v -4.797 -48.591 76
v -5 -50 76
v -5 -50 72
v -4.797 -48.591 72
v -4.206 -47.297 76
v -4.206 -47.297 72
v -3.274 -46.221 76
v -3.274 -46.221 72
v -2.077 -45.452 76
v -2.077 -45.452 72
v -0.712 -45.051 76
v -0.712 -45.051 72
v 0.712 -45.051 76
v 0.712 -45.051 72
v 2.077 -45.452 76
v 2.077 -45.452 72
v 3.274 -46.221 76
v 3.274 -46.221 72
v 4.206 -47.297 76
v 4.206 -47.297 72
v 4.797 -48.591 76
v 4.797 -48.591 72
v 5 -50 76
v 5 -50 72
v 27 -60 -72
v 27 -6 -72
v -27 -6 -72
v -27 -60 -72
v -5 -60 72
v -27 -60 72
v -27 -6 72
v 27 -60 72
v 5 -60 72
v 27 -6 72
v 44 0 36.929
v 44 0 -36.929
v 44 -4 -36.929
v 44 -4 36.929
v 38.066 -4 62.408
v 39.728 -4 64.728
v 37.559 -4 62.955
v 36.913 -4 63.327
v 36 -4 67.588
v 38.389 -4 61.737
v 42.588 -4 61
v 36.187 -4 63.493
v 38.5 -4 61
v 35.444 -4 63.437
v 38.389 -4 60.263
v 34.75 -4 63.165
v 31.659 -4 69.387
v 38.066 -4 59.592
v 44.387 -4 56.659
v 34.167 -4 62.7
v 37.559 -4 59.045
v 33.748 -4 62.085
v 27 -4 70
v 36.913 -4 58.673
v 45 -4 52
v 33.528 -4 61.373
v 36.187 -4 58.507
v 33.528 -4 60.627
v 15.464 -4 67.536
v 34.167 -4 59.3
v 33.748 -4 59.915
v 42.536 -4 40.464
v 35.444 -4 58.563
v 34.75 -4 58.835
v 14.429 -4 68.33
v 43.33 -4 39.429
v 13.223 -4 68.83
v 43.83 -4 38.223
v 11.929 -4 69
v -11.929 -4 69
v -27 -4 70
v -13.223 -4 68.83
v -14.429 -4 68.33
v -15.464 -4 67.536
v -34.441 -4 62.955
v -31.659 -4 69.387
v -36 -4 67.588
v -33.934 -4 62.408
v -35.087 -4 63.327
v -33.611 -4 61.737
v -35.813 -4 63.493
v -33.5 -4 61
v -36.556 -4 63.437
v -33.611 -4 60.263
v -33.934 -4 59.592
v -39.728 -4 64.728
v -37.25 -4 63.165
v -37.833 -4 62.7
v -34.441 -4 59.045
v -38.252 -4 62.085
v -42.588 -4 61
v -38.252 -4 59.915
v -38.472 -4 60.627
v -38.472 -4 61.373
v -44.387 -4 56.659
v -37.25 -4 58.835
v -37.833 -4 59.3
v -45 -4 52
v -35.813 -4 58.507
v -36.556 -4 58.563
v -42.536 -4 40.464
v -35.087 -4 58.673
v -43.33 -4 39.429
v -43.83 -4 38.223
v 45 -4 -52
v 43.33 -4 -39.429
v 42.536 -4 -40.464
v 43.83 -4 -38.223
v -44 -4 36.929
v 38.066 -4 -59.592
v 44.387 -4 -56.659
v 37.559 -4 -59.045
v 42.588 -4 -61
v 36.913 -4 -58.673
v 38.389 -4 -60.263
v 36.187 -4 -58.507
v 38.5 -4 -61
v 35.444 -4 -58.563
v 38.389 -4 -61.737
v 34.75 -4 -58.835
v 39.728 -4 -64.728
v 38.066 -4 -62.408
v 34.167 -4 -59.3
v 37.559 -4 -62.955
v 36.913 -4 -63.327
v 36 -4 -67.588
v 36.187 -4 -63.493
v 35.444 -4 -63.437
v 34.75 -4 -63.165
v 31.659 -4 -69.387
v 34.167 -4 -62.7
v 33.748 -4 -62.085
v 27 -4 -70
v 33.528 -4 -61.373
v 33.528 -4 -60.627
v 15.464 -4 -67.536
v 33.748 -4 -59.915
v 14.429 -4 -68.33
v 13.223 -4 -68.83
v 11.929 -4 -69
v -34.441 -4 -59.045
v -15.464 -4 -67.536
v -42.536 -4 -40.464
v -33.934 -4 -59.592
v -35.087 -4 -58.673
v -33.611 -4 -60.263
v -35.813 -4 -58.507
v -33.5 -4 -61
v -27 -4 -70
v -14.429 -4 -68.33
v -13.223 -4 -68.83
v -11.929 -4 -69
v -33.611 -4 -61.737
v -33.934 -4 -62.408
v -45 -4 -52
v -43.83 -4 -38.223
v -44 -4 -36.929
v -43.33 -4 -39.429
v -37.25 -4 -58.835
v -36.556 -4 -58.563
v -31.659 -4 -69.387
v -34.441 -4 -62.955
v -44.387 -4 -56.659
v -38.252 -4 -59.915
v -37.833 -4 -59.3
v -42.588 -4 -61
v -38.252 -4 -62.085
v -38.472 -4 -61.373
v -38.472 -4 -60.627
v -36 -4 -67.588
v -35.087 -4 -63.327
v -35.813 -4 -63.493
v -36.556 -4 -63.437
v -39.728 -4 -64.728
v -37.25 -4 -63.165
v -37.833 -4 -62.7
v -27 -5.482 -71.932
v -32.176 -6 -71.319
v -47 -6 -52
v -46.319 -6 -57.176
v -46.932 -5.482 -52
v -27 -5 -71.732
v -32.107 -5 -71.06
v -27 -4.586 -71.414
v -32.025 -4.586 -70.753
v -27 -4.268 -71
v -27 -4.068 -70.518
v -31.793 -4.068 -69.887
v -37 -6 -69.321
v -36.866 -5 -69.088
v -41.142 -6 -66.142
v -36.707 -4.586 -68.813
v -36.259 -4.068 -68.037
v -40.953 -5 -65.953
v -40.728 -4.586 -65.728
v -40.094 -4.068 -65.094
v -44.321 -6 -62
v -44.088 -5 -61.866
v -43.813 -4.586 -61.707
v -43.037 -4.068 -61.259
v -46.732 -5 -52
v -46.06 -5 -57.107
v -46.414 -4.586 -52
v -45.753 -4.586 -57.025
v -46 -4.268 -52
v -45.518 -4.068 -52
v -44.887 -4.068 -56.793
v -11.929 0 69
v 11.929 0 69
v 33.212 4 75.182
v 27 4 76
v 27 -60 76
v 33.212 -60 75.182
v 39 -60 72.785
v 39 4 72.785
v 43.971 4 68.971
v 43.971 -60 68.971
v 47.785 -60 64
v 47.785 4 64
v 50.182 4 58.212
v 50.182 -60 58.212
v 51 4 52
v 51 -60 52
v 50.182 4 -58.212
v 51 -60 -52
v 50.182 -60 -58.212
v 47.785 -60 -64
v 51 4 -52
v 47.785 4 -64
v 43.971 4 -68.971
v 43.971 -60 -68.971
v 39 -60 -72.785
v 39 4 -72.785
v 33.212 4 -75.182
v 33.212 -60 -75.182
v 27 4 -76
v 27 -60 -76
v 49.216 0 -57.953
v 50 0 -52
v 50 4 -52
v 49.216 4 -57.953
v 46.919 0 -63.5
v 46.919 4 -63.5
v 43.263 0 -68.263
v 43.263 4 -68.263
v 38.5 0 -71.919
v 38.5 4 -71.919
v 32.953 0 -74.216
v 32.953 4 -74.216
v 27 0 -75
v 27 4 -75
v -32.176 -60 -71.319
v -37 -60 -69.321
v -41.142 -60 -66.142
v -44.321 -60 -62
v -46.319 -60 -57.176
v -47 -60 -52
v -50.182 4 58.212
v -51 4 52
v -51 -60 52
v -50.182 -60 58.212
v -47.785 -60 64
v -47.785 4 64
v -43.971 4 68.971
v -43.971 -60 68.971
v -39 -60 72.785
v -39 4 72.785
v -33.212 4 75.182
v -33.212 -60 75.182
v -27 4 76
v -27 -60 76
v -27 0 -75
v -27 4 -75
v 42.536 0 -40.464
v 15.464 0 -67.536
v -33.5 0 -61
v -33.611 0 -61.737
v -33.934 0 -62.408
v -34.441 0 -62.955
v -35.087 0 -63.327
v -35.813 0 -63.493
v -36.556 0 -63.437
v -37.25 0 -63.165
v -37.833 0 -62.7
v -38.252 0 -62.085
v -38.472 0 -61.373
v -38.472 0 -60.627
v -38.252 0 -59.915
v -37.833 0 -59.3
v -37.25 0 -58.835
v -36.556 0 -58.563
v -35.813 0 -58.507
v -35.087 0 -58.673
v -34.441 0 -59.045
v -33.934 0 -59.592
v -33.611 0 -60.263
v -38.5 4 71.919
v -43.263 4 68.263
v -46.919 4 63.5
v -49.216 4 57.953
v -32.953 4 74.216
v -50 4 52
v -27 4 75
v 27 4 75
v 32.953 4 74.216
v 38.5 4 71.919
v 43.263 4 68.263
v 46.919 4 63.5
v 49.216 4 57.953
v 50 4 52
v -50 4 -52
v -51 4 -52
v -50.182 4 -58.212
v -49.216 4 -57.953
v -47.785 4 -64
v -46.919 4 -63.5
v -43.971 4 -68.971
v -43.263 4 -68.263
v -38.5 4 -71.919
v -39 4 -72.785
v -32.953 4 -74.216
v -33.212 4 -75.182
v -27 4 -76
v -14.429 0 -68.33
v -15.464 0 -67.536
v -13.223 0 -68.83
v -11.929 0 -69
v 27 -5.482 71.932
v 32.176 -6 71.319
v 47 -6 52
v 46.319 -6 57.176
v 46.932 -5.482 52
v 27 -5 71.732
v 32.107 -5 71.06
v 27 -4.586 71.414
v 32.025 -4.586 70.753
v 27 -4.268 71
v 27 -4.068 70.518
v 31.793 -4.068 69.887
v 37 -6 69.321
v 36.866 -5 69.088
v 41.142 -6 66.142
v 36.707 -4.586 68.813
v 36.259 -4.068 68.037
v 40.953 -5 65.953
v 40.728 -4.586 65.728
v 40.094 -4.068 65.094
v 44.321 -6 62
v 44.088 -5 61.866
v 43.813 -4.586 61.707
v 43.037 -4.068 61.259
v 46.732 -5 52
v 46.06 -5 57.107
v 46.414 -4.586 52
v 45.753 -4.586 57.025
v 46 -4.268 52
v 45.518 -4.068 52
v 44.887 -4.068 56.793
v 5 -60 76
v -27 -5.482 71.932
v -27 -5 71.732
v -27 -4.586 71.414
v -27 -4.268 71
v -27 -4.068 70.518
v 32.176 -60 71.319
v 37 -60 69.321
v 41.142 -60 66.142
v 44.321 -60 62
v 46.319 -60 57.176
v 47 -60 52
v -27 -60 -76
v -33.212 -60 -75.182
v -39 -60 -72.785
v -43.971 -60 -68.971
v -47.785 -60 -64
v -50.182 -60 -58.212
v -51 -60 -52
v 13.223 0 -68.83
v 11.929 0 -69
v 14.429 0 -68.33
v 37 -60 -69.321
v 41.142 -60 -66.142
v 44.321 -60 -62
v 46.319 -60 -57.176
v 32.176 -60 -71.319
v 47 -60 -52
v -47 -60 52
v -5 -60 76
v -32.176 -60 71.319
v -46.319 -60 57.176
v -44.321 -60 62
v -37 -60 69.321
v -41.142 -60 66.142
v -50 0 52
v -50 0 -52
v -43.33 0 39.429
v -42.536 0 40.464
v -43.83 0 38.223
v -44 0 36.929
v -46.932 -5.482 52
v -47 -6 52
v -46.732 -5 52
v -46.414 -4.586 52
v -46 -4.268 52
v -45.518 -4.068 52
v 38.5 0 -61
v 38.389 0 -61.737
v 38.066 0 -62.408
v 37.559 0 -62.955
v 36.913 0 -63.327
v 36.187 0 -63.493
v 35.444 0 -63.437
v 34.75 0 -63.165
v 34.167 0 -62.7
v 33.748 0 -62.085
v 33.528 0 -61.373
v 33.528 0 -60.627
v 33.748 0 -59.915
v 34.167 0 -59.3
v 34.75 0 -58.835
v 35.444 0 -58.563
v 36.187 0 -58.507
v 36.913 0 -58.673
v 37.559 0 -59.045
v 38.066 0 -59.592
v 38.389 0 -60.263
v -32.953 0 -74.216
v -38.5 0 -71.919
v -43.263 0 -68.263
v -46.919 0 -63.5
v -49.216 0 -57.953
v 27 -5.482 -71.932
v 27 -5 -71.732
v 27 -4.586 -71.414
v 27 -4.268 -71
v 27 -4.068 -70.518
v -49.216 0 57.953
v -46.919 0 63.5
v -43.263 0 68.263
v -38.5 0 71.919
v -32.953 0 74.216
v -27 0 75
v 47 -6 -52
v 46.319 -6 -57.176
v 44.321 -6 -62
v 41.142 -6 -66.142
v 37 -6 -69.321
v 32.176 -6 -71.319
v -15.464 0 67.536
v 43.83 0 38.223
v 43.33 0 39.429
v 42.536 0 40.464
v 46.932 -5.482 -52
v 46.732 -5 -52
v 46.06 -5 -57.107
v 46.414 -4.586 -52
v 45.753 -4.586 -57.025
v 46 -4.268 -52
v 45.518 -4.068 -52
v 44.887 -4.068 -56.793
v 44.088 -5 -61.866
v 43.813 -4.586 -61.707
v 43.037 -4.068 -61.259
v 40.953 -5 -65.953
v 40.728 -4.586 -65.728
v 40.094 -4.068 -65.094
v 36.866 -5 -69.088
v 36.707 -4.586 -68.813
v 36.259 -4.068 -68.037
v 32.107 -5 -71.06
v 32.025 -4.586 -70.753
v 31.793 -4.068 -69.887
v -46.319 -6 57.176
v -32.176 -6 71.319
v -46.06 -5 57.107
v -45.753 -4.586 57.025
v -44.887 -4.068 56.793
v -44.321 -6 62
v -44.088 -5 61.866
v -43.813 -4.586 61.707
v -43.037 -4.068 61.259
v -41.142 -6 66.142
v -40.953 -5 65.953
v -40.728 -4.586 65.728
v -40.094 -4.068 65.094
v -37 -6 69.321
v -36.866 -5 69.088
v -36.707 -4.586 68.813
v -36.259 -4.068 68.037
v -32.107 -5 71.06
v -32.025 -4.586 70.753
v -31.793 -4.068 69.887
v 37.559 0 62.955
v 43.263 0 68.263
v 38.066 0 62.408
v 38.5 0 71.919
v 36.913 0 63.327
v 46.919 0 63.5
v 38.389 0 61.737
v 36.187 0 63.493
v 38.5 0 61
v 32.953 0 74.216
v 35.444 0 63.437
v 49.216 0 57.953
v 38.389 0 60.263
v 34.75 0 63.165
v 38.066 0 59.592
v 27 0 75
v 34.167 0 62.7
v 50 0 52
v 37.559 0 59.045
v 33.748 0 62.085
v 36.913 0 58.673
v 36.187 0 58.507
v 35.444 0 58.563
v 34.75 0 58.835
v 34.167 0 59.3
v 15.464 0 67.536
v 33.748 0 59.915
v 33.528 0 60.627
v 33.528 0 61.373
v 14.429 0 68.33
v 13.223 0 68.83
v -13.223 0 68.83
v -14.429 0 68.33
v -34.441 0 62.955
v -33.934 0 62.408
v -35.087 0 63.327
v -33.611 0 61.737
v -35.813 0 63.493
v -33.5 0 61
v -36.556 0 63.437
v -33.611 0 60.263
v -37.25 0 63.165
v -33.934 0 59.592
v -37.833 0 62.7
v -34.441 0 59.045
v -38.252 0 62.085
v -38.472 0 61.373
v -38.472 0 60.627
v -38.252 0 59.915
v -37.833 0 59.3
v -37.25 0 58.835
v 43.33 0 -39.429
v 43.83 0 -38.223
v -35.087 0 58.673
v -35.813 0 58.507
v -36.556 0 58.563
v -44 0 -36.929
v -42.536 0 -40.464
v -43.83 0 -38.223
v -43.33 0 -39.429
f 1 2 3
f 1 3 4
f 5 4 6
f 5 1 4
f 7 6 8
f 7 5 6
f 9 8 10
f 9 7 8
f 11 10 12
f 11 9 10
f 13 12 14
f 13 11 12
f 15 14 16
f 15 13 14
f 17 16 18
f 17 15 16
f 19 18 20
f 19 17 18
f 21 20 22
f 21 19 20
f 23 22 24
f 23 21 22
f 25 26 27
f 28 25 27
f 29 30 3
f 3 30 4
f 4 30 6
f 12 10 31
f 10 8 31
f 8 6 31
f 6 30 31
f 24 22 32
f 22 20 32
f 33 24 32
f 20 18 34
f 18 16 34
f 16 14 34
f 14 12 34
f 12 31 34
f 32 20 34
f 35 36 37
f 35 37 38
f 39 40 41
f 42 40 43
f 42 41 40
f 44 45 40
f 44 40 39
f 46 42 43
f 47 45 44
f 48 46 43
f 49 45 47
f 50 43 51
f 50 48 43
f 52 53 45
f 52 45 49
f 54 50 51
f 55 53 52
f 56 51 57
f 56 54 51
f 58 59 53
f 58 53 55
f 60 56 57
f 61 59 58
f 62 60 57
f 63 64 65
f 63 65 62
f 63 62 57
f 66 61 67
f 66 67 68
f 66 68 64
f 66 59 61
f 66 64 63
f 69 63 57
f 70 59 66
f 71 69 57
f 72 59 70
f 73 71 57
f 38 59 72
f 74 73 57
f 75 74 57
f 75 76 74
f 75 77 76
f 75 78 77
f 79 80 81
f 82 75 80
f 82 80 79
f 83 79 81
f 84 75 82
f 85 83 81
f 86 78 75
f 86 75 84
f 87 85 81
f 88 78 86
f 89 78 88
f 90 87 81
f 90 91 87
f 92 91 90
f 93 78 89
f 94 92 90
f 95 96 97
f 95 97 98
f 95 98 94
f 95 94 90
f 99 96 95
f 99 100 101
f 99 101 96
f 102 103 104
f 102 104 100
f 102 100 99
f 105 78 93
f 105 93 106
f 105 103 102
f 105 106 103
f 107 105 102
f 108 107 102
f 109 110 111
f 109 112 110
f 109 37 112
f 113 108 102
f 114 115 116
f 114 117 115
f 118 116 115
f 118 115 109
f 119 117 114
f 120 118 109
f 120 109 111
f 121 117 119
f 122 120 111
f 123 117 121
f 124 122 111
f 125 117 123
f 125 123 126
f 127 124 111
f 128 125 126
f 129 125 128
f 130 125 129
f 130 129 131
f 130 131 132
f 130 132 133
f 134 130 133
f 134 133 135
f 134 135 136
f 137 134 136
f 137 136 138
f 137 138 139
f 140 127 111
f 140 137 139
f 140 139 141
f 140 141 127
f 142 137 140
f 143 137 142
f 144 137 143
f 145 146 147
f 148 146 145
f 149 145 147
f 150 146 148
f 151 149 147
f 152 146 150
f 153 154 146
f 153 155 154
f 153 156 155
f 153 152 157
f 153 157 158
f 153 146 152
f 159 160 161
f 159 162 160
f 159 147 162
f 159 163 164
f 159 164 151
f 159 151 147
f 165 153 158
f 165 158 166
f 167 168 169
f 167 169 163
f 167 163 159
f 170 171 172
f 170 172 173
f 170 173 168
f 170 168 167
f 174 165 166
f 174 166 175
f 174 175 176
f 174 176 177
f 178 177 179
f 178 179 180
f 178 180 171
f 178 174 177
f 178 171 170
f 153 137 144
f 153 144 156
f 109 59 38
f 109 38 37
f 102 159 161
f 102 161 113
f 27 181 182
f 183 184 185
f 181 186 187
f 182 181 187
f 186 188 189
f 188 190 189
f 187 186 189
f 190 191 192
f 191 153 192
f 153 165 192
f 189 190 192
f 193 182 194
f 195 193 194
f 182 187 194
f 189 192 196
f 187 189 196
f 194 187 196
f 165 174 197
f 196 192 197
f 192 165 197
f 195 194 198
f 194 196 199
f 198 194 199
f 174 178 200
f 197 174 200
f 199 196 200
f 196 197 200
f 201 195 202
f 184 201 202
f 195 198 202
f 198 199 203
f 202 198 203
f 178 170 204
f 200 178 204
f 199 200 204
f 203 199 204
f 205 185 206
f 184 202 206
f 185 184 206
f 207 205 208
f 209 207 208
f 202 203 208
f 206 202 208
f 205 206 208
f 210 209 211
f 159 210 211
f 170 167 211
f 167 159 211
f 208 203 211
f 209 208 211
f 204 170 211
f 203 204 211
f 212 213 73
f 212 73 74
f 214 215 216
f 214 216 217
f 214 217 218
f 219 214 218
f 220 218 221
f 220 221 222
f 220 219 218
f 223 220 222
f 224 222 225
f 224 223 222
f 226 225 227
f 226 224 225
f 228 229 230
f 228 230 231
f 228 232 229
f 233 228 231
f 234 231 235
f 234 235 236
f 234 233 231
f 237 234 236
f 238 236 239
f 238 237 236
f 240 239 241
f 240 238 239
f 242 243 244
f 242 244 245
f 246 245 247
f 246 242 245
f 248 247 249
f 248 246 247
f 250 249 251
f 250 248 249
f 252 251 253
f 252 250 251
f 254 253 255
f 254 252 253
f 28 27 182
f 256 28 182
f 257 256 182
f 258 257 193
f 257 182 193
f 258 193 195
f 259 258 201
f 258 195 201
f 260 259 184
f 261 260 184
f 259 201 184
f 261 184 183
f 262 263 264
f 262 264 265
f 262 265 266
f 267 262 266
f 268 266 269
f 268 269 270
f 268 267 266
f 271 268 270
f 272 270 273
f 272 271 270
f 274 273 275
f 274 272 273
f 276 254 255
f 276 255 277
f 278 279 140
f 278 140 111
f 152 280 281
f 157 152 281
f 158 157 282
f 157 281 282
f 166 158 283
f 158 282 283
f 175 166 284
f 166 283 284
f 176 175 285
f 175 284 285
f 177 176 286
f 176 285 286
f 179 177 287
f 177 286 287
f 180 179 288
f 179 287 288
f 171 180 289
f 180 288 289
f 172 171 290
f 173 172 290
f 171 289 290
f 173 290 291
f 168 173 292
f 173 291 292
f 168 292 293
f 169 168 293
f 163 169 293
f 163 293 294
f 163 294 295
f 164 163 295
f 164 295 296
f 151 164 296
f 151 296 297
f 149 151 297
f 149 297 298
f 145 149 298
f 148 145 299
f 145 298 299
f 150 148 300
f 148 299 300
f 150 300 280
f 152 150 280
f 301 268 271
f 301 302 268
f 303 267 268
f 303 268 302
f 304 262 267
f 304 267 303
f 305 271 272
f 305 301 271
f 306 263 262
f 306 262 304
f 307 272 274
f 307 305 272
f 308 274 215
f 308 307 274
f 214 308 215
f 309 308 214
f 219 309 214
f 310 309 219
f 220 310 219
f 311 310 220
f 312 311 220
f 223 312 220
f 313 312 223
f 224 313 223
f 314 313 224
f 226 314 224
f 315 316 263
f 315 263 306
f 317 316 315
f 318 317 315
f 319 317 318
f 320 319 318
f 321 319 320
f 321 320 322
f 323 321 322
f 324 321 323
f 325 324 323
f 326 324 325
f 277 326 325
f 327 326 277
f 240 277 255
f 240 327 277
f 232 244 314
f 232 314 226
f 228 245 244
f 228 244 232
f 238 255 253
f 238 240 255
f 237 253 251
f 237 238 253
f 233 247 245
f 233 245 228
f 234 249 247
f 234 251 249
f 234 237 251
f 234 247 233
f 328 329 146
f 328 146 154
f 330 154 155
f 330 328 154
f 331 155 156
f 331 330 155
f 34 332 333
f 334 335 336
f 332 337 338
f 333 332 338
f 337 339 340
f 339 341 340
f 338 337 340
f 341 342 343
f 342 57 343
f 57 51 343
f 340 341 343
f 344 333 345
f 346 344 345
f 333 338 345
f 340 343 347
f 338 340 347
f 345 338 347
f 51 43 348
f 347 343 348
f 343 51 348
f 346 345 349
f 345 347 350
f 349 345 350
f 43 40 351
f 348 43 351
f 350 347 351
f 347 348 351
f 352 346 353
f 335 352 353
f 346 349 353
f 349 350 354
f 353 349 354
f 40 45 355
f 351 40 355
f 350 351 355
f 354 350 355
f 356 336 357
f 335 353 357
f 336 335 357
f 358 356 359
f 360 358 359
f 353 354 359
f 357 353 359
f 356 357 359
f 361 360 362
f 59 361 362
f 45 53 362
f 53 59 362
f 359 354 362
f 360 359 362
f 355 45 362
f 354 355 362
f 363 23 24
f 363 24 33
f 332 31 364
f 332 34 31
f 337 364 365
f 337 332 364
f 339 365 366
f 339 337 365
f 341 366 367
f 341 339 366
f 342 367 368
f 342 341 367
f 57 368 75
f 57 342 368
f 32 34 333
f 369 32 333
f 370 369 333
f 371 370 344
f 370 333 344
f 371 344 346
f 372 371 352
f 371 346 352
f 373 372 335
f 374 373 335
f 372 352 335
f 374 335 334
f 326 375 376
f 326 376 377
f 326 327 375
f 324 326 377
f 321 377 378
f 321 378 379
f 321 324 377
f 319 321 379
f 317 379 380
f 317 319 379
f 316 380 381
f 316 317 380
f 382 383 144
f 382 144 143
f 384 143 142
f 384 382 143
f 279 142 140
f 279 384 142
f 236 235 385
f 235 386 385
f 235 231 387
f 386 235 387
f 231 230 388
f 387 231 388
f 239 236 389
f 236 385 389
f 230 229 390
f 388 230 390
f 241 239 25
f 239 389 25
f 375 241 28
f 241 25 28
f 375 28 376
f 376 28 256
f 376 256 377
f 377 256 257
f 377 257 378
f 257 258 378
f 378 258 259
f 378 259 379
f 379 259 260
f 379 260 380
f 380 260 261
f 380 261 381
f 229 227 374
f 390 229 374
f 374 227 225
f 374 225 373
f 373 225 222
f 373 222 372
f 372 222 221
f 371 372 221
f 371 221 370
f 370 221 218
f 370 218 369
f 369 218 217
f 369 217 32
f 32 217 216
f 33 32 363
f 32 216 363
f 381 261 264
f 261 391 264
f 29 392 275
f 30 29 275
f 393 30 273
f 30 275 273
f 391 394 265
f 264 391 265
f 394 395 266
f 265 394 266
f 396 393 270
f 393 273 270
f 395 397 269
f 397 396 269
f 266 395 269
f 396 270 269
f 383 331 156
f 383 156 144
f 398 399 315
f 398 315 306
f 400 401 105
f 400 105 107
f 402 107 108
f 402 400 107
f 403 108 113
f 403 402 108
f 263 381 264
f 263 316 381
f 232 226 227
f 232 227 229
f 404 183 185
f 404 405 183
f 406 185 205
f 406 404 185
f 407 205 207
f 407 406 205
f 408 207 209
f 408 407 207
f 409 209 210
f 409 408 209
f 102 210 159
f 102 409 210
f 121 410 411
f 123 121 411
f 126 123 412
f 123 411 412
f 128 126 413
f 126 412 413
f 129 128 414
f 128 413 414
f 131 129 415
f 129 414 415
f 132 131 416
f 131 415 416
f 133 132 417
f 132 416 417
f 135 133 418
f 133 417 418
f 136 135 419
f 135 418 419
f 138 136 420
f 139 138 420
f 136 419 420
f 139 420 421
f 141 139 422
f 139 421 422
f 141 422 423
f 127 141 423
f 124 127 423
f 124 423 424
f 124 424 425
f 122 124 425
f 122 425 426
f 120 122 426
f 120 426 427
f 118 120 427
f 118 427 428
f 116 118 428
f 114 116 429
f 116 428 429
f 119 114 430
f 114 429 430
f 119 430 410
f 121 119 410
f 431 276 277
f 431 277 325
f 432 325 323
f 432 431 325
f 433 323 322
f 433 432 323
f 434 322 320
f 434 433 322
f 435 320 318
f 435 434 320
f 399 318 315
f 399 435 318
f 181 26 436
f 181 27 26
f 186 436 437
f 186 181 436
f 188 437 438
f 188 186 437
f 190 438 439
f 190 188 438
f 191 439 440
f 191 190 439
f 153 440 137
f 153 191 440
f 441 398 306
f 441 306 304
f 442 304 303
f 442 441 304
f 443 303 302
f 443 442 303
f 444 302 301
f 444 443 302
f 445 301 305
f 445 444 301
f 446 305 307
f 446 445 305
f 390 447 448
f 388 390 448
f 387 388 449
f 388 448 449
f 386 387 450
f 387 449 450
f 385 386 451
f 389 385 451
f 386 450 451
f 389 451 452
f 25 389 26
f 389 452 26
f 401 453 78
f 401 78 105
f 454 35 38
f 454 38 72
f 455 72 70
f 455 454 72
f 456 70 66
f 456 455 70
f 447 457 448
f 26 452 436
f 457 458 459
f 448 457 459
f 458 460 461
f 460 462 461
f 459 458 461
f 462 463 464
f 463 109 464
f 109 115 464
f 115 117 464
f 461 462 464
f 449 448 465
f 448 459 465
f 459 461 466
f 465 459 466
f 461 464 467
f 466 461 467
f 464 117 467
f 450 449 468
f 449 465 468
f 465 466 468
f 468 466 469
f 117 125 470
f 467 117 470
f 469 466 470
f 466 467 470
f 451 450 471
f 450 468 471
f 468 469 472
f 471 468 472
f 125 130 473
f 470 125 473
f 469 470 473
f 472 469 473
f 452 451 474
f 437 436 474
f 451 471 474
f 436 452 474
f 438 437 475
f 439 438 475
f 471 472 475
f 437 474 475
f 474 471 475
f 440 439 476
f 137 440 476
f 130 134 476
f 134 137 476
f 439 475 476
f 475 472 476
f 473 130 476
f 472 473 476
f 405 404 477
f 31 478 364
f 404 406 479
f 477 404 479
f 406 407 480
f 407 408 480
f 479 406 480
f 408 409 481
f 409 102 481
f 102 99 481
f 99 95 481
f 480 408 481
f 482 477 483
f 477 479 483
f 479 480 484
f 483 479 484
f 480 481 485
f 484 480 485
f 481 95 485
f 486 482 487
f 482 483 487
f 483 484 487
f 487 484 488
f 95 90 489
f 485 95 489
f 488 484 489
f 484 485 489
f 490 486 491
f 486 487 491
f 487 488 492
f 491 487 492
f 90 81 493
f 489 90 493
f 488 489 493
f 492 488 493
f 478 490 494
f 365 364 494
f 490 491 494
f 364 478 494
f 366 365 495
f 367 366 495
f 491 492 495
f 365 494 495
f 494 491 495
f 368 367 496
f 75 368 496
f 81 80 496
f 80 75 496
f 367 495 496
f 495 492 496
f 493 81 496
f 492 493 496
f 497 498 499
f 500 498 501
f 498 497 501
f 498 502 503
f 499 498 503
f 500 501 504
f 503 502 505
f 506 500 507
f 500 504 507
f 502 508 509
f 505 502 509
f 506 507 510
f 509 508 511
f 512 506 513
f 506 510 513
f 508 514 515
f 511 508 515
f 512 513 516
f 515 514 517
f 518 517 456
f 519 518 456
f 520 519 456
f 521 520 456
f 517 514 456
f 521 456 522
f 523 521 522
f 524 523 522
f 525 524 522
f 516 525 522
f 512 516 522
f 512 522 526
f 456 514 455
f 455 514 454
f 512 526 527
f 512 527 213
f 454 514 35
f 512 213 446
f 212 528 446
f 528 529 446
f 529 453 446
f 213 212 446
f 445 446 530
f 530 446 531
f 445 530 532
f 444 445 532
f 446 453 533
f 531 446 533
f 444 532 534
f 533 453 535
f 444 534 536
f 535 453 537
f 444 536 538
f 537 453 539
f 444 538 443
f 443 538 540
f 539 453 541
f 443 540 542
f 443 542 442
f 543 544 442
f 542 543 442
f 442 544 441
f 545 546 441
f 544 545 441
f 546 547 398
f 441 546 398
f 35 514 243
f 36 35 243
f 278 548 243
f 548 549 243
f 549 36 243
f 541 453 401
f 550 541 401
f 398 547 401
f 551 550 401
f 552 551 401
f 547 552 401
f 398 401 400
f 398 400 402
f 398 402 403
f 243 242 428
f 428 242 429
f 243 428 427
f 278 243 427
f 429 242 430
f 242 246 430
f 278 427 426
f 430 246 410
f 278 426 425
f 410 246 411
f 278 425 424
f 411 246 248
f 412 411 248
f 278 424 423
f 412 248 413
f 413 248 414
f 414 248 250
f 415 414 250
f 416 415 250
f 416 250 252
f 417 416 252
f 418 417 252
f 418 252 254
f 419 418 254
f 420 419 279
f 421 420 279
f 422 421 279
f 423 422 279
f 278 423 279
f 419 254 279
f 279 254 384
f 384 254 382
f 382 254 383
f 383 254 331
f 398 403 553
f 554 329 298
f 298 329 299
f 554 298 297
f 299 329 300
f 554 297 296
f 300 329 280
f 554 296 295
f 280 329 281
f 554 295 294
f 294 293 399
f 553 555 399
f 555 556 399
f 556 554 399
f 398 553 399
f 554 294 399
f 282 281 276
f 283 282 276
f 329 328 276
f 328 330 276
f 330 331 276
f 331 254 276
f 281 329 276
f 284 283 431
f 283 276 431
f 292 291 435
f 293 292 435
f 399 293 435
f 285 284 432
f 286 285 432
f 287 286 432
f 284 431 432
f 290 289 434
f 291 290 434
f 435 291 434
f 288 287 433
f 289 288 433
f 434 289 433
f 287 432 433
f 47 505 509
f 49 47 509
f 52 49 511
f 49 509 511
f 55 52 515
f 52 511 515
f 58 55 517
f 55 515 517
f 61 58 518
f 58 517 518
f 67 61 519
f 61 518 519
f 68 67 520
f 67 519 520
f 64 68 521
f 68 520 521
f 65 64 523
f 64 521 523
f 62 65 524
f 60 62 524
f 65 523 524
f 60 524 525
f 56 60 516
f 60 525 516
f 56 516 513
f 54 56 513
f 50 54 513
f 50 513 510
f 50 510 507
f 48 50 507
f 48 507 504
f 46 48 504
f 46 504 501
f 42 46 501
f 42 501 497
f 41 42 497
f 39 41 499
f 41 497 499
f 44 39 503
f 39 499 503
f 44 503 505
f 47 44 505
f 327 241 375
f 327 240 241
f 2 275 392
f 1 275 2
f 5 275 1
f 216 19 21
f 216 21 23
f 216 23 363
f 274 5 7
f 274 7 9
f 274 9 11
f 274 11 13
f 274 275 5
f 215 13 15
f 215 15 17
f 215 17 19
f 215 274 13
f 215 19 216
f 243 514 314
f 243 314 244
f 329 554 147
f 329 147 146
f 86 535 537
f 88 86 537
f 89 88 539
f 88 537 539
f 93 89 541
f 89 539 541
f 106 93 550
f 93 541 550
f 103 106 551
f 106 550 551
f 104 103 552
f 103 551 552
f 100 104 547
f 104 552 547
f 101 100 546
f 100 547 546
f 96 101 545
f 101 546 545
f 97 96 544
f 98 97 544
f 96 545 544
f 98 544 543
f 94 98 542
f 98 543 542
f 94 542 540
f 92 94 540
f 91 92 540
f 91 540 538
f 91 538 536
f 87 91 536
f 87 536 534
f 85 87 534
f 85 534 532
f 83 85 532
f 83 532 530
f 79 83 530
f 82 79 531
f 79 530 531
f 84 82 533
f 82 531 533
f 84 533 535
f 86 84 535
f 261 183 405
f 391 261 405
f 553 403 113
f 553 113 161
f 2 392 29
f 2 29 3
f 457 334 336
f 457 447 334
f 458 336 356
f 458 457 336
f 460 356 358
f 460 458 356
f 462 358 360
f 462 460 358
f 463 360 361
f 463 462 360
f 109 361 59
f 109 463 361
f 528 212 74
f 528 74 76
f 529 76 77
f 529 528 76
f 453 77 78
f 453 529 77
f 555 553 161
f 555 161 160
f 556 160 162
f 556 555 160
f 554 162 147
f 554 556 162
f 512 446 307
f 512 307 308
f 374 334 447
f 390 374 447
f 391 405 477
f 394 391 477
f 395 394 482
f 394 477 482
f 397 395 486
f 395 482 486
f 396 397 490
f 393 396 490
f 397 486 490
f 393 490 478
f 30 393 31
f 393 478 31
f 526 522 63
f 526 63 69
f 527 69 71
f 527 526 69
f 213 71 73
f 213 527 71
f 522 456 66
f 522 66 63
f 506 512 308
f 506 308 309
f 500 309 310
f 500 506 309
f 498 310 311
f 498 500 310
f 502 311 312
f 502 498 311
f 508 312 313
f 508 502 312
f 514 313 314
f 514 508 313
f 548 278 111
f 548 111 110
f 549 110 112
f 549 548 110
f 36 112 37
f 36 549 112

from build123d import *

# Parameters (mm, degrees)
SKETCH1_R           = 2.5
BOSS_EXTRUDE1_DEPTH = 4
BOSS_EXTRUDE2_DEPTH = 4
BOSS_EXTRUDE3_DEPTH = 56
CUT_EXTRUDE1_REACH  = 154
FILLET1_R           = 2


with BuildPart() as part:
    # Sketch1 → Boss-Extrude1 (new body)
    with BuildSketch(Plane(origin=(0, 0, 0), x_dir=(1, 0, 0), z_dir=(0, 1, 0))):
        with BuildLine():
            Line((-51, -52), (-51, 52))
            ThreePointArc((-51, 52), (-43.970562748, 68.970562748), (-27, 76))
            Line((-27, 76), (27, 76))
            ThreePointArc((27, 76), (43.970562748, 68.970562748), (51, 52))
            Line((51, 52), (51, -52))
            ThreePointArc((51, -52), (43.970562748, -68.970562748), (27, -76))
            Line((27, -76), (-27, -76))
            ThreePointArc((-27, -76), (-43.970562748, -68.970562748), (-51, -52))
        make_face()
        with Locations((-36, 61)):
            Circle(SKETCH1_R, mode=Mode.SUBTRACT)
        with Locations((-36, -61)):
            Circle(SKETCH1_R, mode=Mode.SUBTRACT)
        with Locations((36, -61)):
            Circle(SKETCH1_R, mode=Mode.SUBTRACT)
        with Locations((36, 61)):
            Circle(SKETCH1_R, mode=Mode.SUBTRACT)
        with BuildLine():
            Line((-44, -36.928932188), (-44, 36.928932188))
            ThreePointArc((-44, 36.928932188), (-43.619397663, 38.84234935), (-42.535533906, 40.464466094))
            Line((-42.535533906, 40.464466094), (-15.464466094, 67.535533906))
            ThreePointArc((-15.464466094, 67.535533906), (-13.84234935, 68.619397663), (-11.928932188, 69))
            Line((-11.928932188, 69), (11.928932188, 69))
            ThreePointArc((11.928932188, 69), (13.84234935, 68.619397663), (15.464466094, 67.535533906))
            Line((15.464466094, 67.535533906), (42.535533906, 40.464466094))
            ThreePointArc((42.535533906, 40.464466094), (43.619397663, 38.84234935), (44, 36.928932188))
            Line((44, 36.928932188), (44, -36.928932188))
            ThreePointArc((44, -36.928932188), (43.619397663, -38.84234935), (42.535533906, -40.464466094))
            Line((42.535533906, -40.464466094), (15.464466094, -67.535533906))
            ThreePointArc((15.464466094, -67.535533906), (13.84234935, -68.619397663), (11.928932188, -69))
            Line((11.928932188, -69), (-11.928932188, -69))
            ThreePointArc((-11.928932188, -69), (-13.84234935, -68.619397663), (-15.464466094, -67.535533906))
            Line((-15.464466094, -67.535533906), (-42.535533906, -40.464466094))
            ThreePointArc((-42.535533906, -40.464466094), (-43.619397663, -38.84234935), (-44, -36.928932188))
        make_face(mode=Mode.SUBTRACT)
    extrude(amount=-BOSS_EXTRUDE1_DEPTH)

    # Sketch2 → Boss-Extrude2 (add)
    with BuildSketch(Plane(origin=(0, 0, 0), x_dir=(1, 0, 0), z_dir=(0, 1, 0))):
        with BuildLine():
            Line((-27, -76), (27, -76))
            ThreePointArc((27, -76), (43.970562748, -68.970562748), (51, -52))
            Line((51, -52), (51, 52))
            ThreePointArc((51, 52), (43.970562748, 68.970562748), (27, 76))
            Line((27, 76), (-27, 76))
            ThreePointArc((-27, 76), (-43.970562748, 68.970562748), (-51, 52))
            Line((-51, 52), (-51, -52))
            ThreePointArc((-51, -52), (-43.970562748, -68.970562748), (-27, -76))
        make_face()
        with BuildLine():
            Line((-50, 52), (-50, -52))
            ThreePointArc((-50, -52), (-43.263455967, -68.263455967), (-27, -75))
            Line((-27, -75), (27, -75))
            ThreePointArc((27, -75), (43.263455967, -68.263455967), (50, -52))
            Line((50, -52), (50, 52))
            ThreePointArc((50, 52), (43.263455967, 68.263455967), (27, 75))
            Line((27, 75), (-27, 75))
            ThreePointArc((-27, 75), (-43.263455967, 68.263455967), (-50, 52))
        make_face(mode=Mode.SUBTRACT)
    extrude(amount=BOSS_EXTRUDE2_DEPTH)

    # Sketch3 → Boss-Extrude3 (add)
    with BuildSketch(Plane.XZ.offset(4)):
        with BuildLine():
            Line((-51, -52), (-51, 52))
            ThreePointArc((-51, 52), (-43.970562748, 68.970562748), (-27, 76))
            Line((-27, 76), (27, 76))
            ThreePointArc((27, 76), (43.970562748, 68.970562748), (51, 52))
            Line((51, 52), (51, -52))
            ThreePointArc((51, -52), (43.970562748, -68.970562748), (27, -76))
            Line((27, -76), (-27, -76))
            ThreePointArc((-27, -76), (-43.970562748, -68.970562748), (-51, -52))
        make_face()
        with BuildLine():
            Line((-47, -52), (-47, 52))
            ThreePointArc((-47, 52), (-41.142135624, 66.142135624), (-27, 72))
            Line((-27, 72), (27, 72))
            ThreePointArc((27, 72), (41.142135624, 66.142135624), (47, 52))
            Line((47, 52), (47, -52))
            ThreePointArc((47, -52), (41.142135624, -66.142135624), (27, -72))
            Line((27, -72), (-27, -72))
            ThreePointArc((-27, -72), (-41.142135624, -66.142135624), (-47, -52))
        make_face(mode=Mode.SUBTRACT)
    extrude(amount=BOSS_EXTRUDE3_DEPTH)

    # Sketch4 → Cut-Extrude1 (cut, up to next)
    with BuildSketch(Plane.XY.offset(76), mode=Mode.PRIVATE) as cut_extrude1_sk1:
        with BuildLine():
            Line((5, -60), (-5, -60))
            Line((-5, -60), (-5, -50))
            ThreePointArc((-5, -50), (0, -45), (5, -50))
            Line((5, -50), (5, -60))
        make_face()
    cut_extrude1_tool1 = extrude(cut_extrude1_sk1.sketch, amount=-CUT_EXTRUDE1_REACH, mode=Mode.PRIVATE) & part.part
    add(cut_extrude1_tool1.solids().sort_by_distance((0, -52.991792, 76))[0], mode=Mode.SUBTRACT)

    # Fillet1
    fillet1_edges = [part.edges().sort_by_distance(p)[0] for p in [
        (-41.142135624, -4, -66.142135624),
        (0, -4, -72),
        (41.142135624, -4, -66.142135624),
        (47, -4, 0),
        (41.142135624, -4, 66.142135624),
        (0, -4, 72),
        (-41.142135624, -4, 66.142135624),
        (-47, -4, 0),
    ]]
    fillet(fillet1_edges, radius=FILLET1_R)


solid = part.part
